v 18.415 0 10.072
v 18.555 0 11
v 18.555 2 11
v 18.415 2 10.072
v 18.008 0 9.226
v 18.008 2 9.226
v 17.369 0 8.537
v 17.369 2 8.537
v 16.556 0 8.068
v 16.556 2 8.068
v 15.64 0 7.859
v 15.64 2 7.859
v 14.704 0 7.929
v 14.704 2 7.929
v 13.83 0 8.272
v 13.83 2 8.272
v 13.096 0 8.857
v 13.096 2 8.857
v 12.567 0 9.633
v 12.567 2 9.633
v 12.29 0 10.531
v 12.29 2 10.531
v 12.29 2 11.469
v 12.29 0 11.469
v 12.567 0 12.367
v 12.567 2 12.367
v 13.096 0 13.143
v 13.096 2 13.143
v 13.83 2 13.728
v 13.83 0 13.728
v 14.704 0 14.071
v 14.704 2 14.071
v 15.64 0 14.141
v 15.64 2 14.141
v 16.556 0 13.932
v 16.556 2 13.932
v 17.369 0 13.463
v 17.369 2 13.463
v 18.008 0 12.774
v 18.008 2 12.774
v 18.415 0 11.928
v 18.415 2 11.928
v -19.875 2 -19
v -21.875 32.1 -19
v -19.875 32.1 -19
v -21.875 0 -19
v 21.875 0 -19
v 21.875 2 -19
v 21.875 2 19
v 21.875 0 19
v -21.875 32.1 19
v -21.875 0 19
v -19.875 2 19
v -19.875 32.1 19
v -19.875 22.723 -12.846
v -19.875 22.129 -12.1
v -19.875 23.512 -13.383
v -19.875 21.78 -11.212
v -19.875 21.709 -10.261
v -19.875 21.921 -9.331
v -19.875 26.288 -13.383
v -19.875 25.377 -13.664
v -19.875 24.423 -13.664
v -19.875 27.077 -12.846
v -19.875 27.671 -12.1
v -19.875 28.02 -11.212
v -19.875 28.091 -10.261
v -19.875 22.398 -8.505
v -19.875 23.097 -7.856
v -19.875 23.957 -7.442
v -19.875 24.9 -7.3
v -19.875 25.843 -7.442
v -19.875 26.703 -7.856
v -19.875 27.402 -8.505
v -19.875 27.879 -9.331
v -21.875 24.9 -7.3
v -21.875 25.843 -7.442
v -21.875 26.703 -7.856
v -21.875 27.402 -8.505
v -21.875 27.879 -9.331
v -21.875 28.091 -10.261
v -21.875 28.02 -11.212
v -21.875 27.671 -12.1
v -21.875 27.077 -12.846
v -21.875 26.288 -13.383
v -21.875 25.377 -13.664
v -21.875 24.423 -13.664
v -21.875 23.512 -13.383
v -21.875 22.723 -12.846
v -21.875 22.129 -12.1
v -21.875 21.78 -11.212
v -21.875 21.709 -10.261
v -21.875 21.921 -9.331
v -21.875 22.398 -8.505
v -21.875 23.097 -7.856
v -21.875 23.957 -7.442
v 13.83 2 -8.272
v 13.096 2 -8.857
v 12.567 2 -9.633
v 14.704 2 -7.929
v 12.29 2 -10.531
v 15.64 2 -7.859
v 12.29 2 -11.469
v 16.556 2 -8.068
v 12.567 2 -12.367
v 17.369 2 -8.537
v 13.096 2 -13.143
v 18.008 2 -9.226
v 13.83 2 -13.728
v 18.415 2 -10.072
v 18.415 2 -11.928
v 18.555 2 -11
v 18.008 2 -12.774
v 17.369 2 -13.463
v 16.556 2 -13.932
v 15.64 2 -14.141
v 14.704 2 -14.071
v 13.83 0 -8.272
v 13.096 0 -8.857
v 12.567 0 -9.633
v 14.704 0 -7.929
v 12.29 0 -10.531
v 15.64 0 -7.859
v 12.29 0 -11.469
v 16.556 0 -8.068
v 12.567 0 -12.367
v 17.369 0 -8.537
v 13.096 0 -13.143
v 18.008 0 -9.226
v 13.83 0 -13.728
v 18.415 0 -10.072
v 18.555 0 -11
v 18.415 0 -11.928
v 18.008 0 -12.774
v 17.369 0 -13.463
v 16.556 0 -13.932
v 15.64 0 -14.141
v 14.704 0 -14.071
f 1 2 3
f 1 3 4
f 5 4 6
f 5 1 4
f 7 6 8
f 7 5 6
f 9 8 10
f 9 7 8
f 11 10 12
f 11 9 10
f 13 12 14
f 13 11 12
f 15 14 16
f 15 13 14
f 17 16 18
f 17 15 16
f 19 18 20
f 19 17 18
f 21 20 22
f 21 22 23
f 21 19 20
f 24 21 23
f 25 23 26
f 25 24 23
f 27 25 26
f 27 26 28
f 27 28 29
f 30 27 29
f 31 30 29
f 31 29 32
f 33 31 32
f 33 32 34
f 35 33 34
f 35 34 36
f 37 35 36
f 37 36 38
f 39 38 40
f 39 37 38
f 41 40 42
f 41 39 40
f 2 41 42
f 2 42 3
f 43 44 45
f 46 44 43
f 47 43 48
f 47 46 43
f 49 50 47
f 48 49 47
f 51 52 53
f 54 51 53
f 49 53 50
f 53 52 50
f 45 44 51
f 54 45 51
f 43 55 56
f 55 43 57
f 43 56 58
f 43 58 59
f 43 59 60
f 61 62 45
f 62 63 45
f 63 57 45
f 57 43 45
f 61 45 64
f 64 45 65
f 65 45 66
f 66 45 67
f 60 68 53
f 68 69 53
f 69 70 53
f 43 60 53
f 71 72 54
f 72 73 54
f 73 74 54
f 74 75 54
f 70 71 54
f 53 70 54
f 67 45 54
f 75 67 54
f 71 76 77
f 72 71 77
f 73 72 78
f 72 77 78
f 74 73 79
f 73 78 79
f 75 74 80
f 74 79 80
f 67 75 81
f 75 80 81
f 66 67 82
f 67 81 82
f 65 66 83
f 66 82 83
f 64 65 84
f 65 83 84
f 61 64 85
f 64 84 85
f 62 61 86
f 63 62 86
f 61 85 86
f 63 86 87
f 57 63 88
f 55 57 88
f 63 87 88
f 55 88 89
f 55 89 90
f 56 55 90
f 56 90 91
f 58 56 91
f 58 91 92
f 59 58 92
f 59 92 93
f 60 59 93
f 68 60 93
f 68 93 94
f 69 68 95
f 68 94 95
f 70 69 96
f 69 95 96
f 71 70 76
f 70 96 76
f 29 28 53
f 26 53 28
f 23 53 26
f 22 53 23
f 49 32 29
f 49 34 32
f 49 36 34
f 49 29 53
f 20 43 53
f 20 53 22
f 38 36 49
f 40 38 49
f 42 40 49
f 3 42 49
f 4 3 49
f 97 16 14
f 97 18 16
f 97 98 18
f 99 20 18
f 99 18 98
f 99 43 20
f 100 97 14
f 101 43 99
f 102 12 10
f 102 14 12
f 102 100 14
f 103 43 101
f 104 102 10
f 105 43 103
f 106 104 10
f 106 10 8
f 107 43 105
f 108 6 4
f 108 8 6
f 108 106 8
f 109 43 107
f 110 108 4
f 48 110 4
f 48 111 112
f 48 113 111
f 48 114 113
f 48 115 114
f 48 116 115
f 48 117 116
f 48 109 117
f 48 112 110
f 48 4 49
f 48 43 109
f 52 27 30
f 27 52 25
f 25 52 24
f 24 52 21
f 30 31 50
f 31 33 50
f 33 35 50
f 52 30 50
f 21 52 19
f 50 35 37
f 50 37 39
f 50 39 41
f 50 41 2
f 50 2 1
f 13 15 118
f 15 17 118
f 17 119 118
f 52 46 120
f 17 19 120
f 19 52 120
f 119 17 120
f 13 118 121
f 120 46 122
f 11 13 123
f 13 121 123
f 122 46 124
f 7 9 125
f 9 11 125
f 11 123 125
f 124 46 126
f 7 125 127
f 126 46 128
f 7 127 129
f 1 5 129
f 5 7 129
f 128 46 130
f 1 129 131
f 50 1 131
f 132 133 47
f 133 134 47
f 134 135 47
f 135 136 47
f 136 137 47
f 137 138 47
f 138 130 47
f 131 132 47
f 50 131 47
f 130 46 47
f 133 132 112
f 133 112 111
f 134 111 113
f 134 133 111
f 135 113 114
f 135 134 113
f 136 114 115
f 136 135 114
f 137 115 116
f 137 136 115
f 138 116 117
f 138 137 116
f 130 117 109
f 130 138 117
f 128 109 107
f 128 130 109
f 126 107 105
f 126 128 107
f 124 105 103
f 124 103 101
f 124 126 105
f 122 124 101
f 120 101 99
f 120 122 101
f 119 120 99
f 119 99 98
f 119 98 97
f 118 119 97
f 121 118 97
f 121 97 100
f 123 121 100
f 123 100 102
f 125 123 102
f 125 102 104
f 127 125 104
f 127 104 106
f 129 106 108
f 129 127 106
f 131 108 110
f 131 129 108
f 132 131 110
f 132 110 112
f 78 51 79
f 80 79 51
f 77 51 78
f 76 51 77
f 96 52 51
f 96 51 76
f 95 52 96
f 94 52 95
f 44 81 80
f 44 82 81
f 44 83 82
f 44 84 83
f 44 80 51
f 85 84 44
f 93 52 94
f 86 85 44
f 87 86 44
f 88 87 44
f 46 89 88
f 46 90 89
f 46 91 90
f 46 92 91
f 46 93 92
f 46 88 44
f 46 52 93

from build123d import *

# Parameters (mm, degrees)
SKETCH1_W  = 43.75
SKETCH1_H  = 38
SKETCH1_R  = 3.15
BASE_DEPTH = 2
SKETCH2_W  = 38
SKETCH2_H  = 32.1
SKETCH2_R  = 3.2
TAB_DEPTH  = 2


with BuildPart() as part:
    # Sketch1 → Base (new body)
    with BuildSketch(Plane(origin=(0, 0, 0), x_dir=(1, 0, 0), z_dir=(0, 1, 0))):
        Rectangle(SKETCH1_W, SKETCH1_H)
        with Locations((15.405, 11)):
            Circle(SKETCH1_R, mode=Mode.SUBTRACT)
        with Locations((15.405, -11)):
            Circle(SKETCH1_R, mode=Mode.SUBTRACT)
    extrude(amount=BASE_DEPTH)

    # Sketch2 → Tab (add)
    with BuildSketch(Plane.ZY.offset(21.875)):
        with Locations((0, 16.05)):
            Rectangle(SKETCH2_W, SKETCH2_H)
        with Locations((-10.5, 24.9)):
            Circle(SKETCH2_R, mode=Mode.SUBTRACT)
    extrude(amount=-TAB_DEPTH)


solid = part.part
